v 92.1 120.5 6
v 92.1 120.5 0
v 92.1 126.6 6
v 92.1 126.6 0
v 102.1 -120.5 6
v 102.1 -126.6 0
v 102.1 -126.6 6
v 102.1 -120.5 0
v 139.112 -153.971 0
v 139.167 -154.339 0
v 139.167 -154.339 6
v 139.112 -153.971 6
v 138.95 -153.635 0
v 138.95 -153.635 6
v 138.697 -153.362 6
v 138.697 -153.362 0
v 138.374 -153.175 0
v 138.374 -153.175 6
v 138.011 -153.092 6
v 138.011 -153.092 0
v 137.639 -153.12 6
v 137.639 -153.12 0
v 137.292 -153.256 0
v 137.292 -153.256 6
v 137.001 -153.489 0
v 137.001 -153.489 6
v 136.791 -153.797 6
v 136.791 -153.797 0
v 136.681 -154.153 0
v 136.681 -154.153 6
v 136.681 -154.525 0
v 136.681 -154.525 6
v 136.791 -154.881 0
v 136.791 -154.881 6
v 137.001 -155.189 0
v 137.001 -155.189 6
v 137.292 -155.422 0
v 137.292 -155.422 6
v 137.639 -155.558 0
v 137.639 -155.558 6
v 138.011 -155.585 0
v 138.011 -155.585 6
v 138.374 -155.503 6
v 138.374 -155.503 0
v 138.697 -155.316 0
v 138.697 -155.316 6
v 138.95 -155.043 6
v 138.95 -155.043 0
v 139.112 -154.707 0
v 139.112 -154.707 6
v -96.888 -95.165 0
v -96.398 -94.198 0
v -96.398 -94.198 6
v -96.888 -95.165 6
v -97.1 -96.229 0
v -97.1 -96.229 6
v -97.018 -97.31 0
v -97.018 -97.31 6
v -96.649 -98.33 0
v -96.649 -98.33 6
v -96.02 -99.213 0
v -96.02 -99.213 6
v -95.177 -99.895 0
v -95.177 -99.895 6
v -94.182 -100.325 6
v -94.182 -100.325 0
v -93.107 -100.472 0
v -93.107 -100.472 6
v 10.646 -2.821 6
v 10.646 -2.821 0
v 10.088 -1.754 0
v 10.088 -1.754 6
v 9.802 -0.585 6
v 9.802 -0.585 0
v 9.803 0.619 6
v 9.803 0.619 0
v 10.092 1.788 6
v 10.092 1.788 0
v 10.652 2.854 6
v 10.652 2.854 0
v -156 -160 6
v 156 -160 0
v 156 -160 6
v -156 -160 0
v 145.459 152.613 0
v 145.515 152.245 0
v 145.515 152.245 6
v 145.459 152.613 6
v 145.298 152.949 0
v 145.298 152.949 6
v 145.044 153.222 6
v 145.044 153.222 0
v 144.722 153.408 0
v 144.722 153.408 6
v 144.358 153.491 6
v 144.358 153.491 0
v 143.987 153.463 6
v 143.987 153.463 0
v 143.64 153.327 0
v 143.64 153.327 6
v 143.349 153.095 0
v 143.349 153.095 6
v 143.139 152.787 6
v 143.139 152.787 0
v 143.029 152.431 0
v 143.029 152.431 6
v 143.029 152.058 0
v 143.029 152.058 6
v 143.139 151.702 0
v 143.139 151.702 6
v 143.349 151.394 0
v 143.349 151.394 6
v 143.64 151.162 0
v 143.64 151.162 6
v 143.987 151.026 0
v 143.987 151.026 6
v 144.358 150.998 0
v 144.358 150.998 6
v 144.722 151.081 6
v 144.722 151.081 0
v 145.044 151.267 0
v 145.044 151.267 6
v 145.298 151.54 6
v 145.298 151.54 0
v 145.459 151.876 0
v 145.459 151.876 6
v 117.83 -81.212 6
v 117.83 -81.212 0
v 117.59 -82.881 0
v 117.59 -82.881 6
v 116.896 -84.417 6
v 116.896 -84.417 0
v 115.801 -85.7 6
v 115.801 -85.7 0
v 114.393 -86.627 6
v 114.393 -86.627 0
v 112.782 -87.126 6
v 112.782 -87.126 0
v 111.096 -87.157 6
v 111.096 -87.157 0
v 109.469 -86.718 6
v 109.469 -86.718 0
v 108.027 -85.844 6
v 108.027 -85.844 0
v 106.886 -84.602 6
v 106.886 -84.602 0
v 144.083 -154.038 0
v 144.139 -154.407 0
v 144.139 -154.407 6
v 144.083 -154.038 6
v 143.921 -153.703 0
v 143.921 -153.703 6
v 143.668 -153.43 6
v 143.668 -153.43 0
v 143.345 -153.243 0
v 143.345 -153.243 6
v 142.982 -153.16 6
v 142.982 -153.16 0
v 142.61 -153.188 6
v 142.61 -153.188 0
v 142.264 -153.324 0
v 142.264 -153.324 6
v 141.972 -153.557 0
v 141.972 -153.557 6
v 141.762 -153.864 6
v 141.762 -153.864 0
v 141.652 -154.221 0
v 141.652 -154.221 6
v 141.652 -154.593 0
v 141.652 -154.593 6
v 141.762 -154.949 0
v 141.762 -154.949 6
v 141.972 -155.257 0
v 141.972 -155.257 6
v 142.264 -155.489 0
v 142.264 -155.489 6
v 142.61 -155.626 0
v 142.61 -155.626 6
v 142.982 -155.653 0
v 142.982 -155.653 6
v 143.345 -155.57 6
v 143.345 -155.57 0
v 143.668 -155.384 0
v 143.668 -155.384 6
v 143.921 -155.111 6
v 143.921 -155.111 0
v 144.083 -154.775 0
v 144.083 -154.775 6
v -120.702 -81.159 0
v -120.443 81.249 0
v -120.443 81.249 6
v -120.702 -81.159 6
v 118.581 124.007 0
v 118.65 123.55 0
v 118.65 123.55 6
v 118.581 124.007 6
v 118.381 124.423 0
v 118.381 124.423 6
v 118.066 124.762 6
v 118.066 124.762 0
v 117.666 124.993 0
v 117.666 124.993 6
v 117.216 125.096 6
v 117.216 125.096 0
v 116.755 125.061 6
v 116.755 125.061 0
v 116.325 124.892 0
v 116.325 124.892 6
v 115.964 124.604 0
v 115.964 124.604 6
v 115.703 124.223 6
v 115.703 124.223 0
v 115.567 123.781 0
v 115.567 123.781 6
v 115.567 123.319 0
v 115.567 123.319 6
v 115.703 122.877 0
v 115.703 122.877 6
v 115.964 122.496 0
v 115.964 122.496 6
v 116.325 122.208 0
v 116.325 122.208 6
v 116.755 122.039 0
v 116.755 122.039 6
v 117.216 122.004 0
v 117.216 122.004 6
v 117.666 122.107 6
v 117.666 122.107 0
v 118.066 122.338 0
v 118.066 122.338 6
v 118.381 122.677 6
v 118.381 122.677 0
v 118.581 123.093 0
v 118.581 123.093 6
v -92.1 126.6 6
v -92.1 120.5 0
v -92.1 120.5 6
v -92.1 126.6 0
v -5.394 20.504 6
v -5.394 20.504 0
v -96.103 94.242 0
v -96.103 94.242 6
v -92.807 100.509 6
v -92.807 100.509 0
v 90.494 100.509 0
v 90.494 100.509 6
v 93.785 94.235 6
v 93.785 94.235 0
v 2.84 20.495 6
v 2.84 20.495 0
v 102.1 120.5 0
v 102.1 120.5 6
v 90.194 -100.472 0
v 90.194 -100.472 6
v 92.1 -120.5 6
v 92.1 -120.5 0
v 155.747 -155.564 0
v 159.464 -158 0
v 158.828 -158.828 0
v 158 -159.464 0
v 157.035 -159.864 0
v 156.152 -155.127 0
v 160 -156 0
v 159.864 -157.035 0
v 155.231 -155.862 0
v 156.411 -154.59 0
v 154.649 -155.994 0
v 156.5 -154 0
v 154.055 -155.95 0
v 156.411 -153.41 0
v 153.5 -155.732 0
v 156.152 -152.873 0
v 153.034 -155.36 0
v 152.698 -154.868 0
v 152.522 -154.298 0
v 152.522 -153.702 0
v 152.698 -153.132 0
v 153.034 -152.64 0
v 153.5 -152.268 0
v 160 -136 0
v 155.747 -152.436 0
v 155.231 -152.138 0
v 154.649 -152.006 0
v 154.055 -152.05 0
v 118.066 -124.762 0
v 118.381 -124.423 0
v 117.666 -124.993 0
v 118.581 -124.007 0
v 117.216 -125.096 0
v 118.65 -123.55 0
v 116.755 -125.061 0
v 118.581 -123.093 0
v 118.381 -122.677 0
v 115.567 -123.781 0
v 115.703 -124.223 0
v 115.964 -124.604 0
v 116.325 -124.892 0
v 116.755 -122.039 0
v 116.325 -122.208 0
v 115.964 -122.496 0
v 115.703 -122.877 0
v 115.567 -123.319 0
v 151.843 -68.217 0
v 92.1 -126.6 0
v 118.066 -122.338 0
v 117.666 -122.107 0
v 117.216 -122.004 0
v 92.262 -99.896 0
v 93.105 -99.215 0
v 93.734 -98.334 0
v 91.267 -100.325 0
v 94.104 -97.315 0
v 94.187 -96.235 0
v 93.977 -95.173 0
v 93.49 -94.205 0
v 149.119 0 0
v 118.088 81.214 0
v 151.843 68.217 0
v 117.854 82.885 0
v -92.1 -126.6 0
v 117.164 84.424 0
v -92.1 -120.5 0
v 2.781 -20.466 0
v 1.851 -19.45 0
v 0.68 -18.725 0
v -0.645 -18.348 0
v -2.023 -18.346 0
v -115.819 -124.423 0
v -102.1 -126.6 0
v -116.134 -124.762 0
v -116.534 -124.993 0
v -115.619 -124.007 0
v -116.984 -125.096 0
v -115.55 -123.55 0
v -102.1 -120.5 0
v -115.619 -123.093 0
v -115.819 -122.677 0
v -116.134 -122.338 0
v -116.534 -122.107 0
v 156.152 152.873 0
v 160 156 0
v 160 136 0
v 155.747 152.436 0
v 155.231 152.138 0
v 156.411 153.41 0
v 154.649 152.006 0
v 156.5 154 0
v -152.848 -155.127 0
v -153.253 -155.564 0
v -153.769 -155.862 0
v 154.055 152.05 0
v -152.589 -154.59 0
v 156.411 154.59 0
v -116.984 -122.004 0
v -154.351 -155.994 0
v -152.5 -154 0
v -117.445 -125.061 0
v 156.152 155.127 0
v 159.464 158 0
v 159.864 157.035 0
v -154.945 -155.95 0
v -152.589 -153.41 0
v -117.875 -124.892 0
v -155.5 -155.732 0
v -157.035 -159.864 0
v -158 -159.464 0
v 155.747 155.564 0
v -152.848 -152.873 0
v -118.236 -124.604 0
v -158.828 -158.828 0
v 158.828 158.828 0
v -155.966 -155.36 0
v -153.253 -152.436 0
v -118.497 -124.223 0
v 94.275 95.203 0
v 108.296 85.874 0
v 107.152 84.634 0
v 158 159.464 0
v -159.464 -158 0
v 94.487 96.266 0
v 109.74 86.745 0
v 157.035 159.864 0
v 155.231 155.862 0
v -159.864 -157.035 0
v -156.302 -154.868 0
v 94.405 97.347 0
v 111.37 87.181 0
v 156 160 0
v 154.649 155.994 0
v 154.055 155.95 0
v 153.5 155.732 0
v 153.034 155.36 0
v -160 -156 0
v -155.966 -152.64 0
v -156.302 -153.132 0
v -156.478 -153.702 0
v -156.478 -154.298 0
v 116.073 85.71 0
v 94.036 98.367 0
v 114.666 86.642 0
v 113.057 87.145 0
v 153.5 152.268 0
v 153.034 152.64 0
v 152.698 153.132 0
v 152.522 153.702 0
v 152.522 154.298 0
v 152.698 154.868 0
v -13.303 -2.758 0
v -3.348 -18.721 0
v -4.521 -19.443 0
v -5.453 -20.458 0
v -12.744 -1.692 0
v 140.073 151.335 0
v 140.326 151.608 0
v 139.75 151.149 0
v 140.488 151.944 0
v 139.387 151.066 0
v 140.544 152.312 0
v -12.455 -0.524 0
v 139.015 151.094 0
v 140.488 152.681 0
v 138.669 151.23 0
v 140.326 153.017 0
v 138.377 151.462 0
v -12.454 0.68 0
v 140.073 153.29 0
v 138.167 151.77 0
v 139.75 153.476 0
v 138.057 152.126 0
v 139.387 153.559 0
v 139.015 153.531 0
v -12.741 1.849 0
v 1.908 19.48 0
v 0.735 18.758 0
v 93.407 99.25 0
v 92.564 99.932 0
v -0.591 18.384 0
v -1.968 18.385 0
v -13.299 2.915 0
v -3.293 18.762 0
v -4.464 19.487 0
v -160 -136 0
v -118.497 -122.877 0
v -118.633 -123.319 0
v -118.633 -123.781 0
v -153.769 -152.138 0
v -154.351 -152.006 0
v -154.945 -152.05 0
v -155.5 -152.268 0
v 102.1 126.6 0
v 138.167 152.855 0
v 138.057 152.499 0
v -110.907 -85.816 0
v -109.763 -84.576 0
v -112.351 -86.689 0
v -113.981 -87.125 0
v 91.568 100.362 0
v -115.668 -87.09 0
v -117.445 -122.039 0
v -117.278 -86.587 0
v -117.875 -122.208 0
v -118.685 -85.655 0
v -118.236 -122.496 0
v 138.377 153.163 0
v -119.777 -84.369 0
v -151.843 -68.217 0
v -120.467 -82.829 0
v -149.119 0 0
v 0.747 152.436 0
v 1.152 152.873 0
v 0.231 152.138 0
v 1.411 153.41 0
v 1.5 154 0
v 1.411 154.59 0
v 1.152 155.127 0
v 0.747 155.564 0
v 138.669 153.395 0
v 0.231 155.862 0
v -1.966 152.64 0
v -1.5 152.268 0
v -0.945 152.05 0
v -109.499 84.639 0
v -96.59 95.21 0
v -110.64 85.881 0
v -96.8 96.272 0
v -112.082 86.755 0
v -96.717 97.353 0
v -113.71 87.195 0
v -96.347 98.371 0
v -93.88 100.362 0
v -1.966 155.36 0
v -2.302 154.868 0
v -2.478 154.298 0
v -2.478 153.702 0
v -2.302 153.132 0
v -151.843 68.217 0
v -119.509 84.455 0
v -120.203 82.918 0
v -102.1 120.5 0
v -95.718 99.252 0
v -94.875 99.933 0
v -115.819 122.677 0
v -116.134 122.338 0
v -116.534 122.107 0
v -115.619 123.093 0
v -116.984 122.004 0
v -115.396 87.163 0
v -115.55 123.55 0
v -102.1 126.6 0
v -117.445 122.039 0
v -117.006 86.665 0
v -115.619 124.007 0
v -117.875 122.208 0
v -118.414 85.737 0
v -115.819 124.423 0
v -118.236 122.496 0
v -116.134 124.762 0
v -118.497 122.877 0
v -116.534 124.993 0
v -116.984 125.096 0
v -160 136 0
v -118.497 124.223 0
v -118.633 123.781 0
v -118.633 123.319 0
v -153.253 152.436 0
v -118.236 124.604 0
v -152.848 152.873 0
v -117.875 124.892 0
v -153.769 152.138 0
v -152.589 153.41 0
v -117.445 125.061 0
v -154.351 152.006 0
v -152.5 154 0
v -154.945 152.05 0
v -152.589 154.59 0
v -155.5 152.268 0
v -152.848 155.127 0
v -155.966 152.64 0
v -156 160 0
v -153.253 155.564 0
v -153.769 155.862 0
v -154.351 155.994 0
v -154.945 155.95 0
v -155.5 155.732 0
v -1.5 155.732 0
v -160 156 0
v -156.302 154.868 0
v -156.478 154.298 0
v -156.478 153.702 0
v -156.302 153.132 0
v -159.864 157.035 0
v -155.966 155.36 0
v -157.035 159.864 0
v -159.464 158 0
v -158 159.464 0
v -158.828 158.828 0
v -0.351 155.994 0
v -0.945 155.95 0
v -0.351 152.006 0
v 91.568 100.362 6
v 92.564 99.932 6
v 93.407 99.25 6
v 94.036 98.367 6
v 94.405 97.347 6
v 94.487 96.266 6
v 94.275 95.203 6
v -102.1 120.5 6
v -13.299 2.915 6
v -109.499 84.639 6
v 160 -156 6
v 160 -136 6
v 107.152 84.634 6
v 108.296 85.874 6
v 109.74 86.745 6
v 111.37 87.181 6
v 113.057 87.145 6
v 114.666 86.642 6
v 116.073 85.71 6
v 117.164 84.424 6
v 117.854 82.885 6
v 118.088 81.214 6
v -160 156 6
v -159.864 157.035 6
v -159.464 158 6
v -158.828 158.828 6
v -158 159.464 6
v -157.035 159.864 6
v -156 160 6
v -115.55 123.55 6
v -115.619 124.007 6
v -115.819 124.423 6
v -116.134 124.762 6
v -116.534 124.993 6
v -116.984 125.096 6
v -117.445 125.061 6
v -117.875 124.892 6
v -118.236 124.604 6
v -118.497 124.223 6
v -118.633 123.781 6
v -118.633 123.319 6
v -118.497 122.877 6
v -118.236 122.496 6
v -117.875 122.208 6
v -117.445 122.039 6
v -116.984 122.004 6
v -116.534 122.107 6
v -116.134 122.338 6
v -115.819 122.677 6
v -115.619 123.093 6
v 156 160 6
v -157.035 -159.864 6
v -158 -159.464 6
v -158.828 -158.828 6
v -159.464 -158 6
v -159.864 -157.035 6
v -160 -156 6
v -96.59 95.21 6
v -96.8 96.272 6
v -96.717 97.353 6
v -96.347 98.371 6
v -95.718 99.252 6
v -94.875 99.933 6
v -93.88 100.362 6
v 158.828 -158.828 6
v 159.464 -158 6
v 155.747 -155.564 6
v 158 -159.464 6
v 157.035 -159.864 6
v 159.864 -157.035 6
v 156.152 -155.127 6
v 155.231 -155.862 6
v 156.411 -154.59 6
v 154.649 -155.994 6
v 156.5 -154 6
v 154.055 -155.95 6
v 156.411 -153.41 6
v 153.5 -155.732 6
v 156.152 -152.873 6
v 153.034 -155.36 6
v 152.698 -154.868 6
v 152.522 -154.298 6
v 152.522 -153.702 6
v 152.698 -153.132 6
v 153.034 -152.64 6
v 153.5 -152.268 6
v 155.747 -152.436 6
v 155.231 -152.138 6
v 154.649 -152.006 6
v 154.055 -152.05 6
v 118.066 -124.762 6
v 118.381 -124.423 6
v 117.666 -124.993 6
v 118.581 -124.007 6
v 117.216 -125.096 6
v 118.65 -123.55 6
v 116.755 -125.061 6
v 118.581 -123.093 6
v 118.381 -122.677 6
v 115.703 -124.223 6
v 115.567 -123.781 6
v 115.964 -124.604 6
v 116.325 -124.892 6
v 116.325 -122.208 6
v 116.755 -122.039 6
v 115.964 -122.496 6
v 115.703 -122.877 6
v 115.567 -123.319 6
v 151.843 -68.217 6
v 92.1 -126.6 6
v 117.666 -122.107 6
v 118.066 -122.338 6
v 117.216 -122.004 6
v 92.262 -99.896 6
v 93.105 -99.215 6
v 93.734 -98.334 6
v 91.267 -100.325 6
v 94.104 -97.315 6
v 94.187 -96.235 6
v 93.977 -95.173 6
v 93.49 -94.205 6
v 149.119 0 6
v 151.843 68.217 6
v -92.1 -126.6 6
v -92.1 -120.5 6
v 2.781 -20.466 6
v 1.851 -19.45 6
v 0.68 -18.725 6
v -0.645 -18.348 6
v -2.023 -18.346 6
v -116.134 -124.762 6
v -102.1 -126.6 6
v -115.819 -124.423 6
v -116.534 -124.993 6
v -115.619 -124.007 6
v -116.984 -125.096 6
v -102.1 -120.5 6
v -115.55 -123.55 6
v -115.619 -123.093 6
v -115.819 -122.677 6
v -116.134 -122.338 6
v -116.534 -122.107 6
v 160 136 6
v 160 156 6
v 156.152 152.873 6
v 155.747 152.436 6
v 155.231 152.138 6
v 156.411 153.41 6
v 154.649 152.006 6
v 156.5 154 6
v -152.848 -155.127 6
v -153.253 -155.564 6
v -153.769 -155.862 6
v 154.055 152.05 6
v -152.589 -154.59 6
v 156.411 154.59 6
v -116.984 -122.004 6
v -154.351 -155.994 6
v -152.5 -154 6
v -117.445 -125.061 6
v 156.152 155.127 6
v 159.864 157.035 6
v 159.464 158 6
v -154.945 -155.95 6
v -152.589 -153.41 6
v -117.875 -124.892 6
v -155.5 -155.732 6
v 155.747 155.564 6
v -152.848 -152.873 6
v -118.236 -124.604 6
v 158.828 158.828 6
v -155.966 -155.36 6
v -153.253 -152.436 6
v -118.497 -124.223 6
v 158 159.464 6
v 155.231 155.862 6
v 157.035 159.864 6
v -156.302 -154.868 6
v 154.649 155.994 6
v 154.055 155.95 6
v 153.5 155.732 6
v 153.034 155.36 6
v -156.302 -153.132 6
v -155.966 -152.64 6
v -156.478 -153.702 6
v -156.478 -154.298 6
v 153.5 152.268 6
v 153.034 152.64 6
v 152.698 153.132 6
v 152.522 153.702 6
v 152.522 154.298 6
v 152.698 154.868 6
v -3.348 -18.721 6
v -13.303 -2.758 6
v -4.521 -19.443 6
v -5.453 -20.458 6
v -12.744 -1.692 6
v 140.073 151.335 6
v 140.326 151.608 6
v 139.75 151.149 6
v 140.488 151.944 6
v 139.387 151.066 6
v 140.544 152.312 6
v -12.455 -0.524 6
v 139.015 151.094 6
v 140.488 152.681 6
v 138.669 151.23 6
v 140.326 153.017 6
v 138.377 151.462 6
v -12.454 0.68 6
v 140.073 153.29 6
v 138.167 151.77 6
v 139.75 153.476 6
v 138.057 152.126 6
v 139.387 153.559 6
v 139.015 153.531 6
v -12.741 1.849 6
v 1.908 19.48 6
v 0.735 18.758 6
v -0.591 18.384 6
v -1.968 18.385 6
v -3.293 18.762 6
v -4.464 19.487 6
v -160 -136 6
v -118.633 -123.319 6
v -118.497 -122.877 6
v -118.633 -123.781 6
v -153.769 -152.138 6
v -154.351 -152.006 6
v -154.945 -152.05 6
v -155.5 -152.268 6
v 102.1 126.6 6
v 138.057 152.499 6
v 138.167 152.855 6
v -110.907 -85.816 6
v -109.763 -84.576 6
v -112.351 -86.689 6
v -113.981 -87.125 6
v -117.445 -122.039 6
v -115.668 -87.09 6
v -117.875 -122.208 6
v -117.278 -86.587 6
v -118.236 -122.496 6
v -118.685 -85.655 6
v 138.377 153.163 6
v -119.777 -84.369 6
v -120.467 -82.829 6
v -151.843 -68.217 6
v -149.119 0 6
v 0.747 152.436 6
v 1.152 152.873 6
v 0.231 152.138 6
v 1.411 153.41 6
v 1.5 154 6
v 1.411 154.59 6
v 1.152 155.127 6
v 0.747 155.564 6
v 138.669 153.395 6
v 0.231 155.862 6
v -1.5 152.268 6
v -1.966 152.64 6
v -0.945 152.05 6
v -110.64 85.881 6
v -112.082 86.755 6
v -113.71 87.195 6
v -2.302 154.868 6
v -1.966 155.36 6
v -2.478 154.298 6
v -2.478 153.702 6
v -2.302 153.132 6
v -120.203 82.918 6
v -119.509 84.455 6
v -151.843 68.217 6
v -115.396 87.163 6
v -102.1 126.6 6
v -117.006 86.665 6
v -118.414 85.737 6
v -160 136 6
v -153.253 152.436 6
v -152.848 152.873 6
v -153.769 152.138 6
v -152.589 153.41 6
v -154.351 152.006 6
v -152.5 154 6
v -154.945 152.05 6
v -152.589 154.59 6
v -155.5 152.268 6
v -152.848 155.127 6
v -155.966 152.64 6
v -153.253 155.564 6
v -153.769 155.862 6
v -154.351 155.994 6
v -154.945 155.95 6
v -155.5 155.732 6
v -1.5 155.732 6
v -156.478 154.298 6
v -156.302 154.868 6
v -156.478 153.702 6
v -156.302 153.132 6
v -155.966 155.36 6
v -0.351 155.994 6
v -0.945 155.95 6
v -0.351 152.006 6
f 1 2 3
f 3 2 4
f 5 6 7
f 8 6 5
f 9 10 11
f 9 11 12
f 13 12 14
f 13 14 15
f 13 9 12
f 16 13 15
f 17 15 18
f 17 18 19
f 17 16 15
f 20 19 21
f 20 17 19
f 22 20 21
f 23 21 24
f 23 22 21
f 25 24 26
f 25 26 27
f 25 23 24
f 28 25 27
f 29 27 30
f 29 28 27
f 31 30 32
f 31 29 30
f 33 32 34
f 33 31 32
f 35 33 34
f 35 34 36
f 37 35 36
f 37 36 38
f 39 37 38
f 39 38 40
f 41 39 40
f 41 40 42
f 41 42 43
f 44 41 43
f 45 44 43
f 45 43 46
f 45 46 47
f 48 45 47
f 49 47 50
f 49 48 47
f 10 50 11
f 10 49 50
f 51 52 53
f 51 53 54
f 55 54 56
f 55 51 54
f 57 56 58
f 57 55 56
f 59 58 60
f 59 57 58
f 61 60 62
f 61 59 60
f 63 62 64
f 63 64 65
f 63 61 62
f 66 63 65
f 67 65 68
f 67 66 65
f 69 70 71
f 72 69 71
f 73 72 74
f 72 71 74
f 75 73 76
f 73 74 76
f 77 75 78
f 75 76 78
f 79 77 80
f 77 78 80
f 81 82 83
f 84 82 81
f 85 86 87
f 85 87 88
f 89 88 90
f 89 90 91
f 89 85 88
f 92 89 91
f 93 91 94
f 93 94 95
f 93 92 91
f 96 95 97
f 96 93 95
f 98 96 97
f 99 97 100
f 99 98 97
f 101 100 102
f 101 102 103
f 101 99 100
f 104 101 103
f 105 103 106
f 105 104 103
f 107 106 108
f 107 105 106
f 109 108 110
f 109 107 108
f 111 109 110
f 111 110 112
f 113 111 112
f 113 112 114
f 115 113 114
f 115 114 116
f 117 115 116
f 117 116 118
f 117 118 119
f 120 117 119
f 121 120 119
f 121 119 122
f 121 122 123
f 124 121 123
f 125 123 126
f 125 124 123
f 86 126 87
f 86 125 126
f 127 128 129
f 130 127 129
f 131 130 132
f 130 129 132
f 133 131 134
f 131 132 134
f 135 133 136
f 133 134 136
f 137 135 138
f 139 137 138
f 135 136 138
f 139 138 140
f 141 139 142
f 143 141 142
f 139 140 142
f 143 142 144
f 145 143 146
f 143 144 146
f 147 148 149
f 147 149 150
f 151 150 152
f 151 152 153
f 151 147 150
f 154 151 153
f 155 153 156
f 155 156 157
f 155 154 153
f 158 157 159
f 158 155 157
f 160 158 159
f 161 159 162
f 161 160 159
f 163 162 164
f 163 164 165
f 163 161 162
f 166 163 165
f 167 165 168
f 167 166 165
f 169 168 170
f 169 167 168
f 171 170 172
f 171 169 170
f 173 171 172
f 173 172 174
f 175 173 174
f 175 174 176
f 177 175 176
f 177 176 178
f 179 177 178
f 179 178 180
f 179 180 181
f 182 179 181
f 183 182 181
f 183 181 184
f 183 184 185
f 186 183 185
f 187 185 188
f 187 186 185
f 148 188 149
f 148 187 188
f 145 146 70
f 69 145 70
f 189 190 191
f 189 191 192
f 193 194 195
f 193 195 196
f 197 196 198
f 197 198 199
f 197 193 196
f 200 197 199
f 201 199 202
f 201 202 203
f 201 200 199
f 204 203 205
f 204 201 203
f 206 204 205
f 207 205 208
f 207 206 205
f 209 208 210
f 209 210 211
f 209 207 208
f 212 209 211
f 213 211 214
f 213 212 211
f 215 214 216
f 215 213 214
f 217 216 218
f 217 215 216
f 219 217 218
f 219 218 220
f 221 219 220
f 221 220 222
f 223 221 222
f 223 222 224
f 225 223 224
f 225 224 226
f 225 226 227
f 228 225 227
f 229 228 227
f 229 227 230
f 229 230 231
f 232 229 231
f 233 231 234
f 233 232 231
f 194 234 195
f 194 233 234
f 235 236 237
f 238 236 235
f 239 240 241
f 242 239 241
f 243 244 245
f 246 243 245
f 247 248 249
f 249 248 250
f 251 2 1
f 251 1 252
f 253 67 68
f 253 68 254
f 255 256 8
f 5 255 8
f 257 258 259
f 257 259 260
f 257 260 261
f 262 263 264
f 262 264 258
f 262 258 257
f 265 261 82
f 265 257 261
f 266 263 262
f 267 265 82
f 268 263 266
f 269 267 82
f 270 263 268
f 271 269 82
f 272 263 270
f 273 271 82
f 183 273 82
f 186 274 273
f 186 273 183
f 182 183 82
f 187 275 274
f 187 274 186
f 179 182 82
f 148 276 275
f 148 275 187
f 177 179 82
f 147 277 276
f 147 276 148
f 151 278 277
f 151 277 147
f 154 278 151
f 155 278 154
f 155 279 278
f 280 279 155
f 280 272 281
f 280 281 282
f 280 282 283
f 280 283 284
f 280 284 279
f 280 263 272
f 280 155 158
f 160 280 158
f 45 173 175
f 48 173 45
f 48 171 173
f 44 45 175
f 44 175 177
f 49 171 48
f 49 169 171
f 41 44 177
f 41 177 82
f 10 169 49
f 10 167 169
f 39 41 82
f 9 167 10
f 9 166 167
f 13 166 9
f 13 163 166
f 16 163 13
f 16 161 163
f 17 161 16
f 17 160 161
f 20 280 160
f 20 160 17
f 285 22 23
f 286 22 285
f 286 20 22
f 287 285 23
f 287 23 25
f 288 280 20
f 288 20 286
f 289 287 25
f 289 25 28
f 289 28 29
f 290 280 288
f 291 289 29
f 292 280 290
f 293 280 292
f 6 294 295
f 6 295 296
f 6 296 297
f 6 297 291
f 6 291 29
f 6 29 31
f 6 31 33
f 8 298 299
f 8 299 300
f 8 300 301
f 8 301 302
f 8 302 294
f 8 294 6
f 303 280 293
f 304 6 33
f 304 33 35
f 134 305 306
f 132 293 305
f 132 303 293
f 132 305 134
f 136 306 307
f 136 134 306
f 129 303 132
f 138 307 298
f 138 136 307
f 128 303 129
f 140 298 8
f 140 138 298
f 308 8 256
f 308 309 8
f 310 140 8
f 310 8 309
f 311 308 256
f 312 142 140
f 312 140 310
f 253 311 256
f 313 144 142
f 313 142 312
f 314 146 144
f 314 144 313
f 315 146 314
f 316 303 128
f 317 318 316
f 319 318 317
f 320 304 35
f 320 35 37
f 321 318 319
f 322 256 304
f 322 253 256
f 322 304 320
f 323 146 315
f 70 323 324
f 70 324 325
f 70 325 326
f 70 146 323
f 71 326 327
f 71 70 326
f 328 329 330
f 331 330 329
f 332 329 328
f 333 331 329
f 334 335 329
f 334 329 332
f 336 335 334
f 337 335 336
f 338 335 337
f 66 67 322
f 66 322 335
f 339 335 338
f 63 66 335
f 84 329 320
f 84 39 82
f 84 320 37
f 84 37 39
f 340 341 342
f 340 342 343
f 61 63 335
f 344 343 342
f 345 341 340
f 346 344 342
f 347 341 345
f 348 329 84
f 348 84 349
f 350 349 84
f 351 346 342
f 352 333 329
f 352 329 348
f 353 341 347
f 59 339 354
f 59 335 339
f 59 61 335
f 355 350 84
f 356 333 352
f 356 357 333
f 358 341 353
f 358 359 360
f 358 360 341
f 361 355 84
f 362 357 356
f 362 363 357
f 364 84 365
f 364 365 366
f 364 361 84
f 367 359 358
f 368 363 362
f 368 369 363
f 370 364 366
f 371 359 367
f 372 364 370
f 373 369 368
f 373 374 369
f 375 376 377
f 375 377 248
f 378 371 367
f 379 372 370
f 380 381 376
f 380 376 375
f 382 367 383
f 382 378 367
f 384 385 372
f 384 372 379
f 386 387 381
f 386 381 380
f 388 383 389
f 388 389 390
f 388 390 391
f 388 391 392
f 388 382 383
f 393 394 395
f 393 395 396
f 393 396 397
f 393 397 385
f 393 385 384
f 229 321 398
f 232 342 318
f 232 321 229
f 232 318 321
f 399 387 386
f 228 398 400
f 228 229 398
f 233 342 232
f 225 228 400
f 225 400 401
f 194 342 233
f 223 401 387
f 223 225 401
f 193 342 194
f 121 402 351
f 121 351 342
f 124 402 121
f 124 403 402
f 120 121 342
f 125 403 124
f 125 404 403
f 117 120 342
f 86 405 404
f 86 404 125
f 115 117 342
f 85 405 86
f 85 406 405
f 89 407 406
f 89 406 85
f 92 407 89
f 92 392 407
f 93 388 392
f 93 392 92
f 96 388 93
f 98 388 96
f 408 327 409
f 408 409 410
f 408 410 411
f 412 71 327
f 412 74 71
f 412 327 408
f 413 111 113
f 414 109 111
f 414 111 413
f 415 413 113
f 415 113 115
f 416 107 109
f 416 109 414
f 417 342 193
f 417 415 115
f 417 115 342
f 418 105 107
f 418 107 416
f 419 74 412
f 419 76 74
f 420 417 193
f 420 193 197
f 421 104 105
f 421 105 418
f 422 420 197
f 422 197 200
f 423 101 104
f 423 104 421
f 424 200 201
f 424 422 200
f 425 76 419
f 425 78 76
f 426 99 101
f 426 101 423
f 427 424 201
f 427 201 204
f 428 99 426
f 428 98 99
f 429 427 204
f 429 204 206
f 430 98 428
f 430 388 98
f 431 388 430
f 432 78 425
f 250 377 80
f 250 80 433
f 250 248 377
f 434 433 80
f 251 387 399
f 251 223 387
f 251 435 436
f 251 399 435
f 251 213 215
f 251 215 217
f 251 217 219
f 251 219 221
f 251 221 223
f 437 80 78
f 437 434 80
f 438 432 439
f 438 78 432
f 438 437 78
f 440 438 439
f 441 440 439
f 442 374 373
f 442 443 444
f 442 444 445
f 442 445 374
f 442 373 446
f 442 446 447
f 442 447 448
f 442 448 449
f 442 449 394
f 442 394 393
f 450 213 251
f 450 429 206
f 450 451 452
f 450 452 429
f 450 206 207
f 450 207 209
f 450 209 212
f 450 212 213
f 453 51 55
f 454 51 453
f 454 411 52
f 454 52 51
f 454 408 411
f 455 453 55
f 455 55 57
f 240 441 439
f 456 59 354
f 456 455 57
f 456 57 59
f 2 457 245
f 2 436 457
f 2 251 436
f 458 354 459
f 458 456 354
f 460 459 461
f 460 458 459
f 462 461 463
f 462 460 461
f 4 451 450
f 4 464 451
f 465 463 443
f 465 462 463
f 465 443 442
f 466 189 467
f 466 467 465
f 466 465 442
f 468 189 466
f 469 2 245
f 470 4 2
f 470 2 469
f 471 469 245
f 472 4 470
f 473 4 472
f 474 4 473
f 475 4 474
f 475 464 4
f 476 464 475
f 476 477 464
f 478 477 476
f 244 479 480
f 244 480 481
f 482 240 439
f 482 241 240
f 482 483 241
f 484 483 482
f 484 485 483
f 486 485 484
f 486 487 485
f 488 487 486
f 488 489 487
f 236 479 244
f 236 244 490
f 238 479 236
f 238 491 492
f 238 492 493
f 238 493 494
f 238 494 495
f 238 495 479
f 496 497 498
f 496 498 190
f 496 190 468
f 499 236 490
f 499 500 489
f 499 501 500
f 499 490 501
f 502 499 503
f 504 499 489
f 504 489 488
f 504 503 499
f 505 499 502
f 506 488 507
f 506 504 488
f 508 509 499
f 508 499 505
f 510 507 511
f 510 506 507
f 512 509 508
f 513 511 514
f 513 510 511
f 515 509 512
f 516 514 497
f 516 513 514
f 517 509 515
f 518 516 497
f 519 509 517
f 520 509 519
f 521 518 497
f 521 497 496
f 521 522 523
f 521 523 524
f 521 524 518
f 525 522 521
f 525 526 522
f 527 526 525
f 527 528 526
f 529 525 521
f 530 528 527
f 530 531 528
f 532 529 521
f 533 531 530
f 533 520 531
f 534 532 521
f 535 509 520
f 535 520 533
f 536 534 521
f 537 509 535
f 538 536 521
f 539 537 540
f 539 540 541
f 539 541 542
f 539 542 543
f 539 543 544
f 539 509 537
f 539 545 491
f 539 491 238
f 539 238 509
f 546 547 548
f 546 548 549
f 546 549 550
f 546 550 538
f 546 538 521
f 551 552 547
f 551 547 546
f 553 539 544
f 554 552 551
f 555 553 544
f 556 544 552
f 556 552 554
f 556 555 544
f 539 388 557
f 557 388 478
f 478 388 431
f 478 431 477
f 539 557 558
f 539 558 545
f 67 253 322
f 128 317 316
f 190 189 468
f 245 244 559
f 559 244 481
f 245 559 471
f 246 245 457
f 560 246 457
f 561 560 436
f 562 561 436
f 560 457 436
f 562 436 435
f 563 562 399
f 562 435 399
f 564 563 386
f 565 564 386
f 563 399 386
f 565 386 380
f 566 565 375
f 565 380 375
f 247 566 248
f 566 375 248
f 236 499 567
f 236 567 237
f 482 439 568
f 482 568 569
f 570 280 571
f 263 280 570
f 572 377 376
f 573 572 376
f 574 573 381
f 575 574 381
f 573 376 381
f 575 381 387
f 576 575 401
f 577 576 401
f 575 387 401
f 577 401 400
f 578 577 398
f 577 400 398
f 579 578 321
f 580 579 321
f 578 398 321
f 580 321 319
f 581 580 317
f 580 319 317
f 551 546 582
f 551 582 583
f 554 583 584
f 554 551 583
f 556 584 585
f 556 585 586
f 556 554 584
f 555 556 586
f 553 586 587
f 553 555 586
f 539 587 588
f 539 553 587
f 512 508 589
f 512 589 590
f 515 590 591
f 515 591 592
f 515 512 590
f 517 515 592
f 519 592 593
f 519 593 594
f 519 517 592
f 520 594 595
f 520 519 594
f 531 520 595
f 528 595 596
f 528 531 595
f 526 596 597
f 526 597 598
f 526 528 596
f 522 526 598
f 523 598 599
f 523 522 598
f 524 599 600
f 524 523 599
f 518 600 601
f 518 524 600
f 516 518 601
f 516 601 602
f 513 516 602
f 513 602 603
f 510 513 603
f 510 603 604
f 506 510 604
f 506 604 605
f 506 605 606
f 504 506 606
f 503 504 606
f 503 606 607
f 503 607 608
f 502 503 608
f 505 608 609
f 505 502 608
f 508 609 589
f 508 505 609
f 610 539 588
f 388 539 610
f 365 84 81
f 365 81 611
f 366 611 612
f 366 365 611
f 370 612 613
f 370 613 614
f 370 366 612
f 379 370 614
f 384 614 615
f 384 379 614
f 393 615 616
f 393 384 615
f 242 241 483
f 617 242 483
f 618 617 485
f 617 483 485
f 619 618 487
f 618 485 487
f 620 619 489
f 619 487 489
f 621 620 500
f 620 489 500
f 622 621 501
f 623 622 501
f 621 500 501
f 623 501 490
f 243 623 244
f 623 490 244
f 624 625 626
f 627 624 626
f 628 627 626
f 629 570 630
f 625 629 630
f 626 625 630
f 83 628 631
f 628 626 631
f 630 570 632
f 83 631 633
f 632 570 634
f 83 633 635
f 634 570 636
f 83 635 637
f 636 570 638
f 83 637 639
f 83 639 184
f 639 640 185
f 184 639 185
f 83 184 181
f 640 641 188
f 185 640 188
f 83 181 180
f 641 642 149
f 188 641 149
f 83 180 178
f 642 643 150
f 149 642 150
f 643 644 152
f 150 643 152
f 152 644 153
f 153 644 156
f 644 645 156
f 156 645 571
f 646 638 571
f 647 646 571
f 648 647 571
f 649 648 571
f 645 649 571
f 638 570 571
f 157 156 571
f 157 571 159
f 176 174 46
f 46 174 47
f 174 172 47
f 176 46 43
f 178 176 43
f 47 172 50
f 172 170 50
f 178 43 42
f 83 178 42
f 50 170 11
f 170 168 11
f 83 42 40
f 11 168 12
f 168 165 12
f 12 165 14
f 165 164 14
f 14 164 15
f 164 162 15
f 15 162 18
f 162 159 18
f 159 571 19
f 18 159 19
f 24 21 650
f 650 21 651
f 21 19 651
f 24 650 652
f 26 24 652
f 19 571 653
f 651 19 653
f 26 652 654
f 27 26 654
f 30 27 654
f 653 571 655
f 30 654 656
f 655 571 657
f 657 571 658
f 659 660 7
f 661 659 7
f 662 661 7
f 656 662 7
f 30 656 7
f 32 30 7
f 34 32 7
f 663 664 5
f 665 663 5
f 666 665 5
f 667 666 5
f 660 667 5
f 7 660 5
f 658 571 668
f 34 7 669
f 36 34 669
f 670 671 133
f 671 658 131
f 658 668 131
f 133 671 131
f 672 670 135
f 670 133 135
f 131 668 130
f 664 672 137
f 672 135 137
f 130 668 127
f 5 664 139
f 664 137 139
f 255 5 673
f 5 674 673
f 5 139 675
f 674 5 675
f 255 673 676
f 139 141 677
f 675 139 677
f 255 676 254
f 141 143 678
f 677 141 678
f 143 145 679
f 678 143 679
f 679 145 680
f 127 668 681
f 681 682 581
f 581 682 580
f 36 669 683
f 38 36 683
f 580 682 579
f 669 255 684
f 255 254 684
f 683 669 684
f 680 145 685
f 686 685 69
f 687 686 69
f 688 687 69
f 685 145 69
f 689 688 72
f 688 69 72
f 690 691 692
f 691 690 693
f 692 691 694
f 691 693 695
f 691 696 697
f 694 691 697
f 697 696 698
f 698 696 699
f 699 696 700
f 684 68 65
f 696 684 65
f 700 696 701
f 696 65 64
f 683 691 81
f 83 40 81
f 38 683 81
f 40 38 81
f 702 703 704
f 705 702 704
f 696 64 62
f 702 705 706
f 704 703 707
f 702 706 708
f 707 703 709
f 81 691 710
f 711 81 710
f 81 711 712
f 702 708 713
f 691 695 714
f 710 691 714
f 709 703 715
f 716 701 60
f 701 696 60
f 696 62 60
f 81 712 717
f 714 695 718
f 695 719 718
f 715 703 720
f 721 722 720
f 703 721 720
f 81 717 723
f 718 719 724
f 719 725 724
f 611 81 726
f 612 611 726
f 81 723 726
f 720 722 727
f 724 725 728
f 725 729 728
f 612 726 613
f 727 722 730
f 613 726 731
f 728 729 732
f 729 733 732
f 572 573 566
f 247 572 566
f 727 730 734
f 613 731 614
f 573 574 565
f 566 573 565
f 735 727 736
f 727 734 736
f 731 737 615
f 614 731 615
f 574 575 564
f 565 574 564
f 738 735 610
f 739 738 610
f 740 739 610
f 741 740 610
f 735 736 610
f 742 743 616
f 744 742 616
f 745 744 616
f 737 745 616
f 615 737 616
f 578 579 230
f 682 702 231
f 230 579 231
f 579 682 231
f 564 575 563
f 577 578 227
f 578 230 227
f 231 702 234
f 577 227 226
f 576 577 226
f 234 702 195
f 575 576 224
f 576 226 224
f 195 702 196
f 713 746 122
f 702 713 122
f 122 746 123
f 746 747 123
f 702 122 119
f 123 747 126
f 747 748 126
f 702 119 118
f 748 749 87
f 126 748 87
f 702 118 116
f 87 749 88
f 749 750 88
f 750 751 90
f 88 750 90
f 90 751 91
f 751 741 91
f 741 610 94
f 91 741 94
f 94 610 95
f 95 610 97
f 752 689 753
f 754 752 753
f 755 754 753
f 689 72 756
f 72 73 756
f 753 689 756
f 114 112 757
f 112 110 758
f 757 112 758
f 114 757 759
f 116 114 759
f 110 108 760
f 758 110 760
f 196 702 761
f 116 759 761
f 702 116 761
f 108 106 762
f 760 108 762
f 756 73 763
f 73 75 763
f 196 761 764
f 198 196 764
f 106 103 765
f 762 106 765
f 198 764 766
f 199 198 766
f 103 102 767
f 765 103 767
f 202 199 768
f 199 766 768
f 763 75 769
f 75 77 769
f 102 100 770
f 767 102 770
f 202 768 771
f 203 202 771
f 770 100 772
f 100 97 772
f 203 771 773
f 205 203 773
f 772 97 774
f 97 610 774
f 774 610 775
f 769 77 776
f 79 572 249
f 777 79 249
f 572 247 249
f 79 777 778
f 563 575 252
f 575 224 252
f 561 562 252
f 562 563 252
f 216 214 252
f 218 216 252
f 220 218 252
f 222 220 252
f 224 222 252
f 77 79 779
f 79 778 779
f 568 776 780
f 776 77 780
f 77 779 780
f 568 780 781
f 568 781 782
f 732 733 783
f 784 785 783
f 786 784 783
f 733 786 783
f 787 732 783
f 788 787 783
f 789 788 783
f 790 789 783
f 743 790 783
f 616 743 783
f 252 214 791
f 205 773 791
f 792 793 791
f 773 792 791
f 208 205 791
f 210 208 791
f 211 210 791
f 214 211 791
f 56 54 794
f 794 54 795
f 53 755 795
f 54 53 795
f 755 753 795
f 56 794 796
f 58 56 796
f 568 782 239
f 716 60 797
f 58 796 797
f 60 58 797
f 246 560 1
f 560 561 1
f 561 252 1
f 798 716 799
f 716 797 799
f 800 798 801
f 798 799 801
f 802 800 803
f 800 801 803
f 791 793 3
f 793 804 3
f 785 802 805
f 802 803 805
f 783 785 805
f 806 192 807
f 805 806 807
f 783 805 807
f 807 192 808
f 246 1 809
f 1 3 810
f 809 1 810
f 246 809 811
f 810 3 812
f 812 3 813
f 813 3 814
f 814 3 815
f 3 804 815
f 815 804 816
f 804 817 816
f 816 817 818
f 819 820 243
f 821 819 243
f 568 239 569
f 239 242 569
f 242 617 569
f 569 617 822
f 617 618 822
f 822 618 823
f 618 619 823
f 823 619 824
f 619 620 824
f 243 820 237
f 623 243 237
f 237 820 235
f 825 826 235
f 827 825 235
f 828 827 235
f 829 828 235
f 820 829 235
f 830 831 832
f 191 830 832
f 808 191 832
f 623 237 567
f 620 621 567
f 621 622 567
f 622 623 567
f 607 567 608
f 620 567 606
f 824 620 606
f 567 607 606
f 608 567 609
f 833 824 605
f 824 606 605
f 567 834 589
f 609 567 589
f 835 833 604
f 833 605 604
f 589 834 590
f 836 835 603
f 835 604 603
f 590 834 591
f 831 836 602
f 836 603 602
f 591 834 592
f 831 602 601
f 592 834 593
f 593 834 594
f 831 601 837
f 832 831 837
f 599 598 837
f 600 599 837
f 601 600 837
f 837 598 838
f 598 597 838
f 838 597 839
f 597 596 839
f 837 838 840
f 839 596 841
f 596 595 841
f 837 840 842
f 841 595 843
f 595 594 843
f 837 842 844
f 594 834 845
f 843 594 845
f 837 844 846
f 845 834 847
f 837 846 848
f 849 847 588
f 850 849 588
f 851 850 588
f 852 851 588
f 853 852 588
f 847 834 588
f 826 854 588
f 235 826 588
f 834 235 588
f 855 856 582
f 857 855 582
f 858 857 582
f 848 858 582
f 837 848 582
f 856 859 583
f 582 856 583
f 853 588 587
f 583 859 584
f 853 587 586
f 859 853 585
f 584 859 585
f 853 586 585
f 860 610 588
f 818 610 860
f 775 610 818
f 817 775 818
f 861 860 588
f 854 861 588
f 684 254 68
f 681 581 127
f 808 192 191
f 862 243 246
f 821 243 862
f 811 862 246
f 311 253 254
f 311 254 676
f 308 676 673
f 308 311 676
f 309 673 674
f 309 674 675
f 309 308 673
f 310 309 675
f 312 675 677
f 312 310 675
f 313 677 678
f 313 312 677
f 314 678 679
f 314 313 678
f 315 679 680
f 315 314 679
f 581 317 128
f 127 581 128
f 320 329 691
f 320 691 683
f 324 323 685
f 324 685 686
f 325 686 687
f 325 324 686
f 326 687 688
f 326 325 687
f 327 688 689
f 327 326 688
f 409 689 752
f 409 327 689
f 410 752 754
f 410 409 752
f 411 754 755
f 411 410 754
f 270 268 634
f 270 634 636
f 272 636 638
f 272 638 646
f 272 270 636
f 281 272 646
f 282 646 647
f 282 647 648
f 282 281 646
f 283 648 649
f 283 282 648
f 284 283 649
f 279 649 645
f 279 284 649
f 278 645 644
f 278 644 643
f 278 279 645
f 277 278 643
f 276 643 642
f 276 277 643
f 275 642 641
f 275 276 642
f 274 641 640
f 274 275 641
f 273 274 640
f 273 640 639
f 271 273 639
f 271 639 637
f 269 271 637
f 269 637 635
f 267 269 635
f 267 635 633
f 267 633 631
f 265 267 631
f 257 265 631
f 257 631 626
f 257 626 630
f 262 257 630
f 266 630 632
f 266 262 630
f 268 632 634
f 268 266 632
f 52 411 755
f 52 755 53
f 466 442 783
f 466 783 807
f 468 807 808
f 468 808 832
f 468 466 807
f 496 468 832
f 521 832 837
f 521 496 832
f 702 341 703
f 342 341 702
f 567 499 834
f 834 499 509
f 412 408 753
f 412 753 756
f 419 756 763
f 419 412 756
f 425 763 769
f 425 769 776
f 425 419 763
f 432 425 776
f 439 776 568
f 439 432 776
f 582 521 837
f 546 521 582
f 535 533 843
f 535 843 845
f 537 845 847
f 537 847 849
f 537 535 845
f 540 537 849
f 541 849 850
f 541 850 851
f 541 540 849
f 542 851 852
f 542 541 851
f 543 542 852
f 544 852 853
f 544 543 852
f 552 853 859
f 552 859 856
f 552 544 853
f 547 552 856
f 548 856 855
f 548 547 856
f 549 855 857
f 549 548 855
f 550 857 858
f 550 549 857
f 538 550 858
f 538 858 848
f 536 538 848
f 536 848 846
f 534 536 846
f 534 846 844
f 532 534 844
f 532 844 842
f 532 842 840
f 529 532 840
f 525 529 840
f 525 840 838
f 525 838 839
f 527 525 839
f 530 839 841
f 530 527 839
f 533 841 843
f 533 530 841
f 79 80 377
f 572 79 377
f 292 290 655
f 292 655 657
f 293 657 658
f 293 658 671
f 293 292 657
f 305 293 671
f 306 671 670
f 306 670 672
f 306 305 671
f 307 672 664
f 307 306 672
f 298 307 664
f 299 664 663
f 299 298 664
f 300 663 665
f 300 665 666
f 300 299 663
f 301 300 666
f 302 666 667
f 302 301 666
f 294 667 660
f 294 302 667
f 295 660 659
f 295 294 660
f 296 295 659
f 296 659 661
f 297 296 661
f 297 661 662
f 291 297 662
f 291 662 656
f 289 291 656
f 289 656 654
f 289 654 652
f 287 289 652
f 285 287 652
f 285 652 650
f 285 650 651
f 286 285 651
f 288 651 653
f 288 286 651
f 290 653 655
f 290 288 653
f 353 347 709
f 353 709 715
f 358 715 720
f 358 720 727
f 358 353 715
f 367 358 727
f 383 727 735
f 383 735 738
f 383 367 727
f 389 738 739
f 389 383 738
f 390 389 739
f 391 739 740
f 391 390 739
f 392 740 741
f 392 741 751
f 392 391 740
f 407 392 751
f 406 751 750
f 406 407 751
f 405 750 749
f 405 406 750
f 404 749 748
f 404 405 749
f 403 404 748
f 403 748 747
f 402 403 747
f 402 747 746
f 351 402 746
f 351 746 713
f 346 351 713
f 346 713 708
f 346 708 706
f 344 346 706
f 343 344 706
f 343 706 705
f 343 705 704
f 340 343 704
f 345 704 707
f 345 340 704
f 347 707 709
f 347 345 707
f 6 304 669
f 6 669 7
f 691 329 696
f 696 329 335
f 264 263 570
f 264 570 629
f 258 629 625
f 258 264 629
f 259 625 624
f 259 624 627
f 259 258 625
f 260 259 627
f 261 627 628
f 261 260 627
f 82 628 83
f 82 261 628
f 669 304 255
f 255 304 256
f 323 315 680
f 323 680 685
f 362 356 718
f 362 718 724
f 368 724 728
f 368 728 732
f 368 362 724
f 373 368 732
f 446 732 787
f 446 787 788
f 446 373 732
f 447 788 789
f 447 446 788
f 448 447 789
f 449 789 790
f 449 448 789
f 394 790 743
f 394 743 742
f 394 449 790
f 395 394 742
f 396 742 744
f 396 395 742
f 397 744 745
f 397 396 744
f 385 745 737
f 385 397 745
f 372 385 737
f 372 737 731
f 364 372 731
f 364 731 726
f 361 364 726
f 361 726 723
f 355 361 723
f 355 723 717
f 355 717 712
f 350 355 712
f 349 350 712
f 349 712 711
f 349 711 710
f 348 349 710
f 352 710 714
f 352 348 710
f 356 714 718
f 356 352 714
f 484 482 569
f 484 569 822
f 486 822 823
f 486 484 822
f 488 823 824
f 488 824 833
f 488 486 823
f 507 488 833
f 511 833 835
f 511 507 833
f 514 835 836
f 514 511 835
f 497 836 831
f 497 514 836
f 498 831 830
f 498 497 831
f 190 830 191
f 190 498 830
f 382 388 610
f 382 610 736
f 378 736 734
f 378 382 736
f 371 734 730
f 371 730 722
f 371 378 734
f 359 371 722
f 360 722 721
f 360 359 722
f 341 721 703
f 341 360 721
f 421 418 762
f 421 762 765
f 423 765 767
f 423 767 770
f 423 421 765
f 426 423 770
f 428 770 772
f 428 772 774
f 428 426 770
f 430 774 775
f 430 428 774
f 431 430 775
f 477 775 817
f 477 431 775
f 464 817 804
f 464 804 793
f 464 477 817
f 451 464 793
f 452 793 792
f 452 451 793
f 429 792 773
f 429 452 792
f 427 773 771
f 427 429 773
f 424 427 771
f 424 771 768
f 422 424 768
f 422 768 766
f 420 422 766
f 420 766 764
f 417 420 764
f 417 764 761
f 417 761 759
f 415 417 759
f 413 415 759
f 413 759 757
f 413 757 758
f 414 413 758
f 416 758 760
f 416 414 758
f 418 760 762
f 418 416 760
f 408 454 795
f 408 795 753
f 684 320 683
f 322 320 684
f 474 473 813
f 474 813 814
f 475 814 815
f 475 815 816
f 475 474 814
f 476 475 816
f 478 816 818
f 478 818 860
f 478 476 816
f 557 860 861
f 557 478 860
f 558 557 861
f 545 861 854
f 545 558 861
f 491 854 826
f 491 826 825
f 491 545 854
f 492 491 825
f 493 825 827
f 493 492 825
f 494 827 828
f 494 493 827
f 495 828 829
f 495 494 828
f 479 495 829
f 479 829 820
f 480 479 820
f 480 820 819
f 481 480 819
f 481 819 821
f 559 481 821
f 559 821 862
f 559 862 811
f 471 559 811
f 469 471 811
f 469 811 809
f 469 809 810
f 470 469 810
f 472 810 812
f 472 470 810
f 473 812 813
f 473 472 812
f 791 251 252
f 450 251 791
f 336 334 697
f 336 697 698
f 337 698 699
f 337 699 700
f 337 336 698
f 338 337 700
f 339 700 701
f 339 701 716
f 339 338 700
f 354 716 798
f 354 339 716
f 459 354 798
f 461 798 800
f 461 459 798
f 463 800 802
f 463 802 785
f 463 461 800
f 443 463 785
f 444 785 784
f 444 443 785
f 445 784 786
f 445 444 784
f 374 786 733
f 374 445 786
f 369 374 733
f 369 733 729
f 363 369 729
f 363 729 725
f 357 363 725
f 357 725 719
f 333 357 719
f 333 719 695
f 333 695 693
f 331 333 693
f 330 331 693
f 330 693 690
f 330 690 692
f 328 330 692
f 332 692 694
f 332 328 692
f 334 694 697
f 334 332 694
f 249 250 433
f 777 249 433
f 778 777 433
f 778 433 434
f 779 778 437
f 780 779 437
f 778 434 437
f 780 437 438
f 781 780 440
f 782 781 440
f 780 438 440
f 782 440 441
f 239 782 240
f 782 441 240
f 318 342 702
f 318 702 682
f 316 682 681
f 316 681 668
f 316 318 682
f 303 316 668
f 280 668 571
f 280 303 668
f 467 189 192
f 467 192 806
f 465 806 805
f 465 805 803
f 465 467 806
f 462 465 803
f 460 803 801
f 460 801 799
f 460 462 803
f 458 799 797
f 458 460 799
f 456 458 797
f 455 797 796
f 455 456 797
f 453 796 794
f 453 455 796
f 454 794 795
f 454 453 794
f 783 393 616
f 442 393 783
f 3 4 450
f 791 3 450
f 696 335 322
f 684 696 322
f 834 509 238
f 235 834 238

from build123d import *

# Parameters (mm, degrees)
SKETCH_1_R      = 2
SKETCH_1_R_2    = 1.55
SKETCH_1_R_3    = 1.25
SKETCH_1_W      = 10
SKETCH_1_H      = 6.1
EXTRUDE_1_DEPTH = 6


with BuildPart() as part:
    # Эскиз1 → Бобышка-Вытянуть1 (new body)
    with BuildSketch(Plane.XY):
        with BuildLine():
            Line((160, 156), (160, 136))
            ThreePointArc((160, 136), (149.118825479, 0), (160, -136))
            Line((160, -136), (160, -156))
            ThreePointArc((160, -156), (158.828427125, -158.828427125), (156, -160))
            Line((156, -160), (136, -160))
            Line((136, -160), (-156, -160))
            ThreePointArc((-156, -160), (-158.828427125, -158.828427125), (-160, -156))
            Line((-160, -156), (-160, -136))
            ThreePointArc((-160, -136), (-149.118825479, 0), (-160, 136))
            Line((-160, 136), (-160, 156))
            ThreePointArc((-160, 156), (-158.828427125, 158.828427125), (-156, 160))
            Line((-156, 160), (136, 160))
            Line((136, 160), (156, 160))
            ThreePointArc((156, 160), (158.828427125, 158.828427125), (160, 156))
        make_face()
        with Locations((-154.5, 154)):
            Circle(SKETCH_1_R, mode=Mode.SUBTRACT)
        with Locations((-154.5, -154)):
            Circle(SKETCH_1_R, mode=Mode.SUBTRACT)
        with Locations((154.5, 154)):
            Circle(SKETCH_1_R, mode=Mode.SUBTRACT)
        with Locations((154.5, -154)):
            Circle(SKETCH_1_R, mode=Mode.SUBTRACT)
        with Locations((117.1, -123.55)):
            Circle(SKETCH_1_R_2, mode=Mode.SUBTRACT)
        with Locations((-117.1, -123.55)):
            Circle(SKETCH_1_R_2, mode=Mode.SUBTRACT)
        with Locations((-117.1, 123.55)):
            Circle(SKETCH_1_R_2, mode=Mode.SUBTRACT)
        with Locations((117.1, 123.55)):
            Circle(SKETCH_1_R_2, mode=Mode.SUBTRACT)
        with Locations((142.88852833, -154.406847052)):
            Circle(SKETCH_1_R_3, mode=Mode.SUBTRACT)
        with Locations((137.91717333, -154.338989052)):
            Circle(SKETCH_1_R_3, mode=Mode.SUBTRACT)
        with Locations((-0.5, 154)):
            Circle(SKETCH_1_R, mode=Mode.SUBTRACT)
        with Locations((144.264881547, 152.244611453)):
            Circle(SKETCH_1_R_3, mode=Mode.SUBTRACT)
        with Locations((139.293526547, 152.312469453)):
            Circle(SKETCH_1_R_3, mode=Mode.SUBTRACT)
        with Locations((97.1, 123.55)):
            Rectangle(SKETCH_1_W, SKETCH_1_H, mode=Mode.SUBTRACT)
        with Locations((-97.1, -123.55)):
            Rectangle(SKETCH_1_W, SKETCH_1_H, mode=Mode.SUBTRACT)
        with Locations((97.1, -123.55)):
            Rectangle(SKETCH_1_W, SKETCH_1_H, mode=Mode.SUBTRACT)
        with Locations((-97.1, 123.55)):
            Rectangle(SKETCH_1_W, SKETCH_1_H, mode=Mode.SUBTRACT)
        with BuildLine():
            Line((93.489652385, -94.205074627), (2.780610095, -20.466408797))
            ThreePointArc((2.780610095, -20.466408797), (-1.333842507, -18.299575929), (-5.45296535, -20.457517519))
            Line((-5.45296535, -20.457517519), (-96.398158259, -94.197961604))
            ThreePointArc((-96.398158259, -94.197961604), (-96.649394743, -98.329753251), (-93.107179505, -100.471606))
            Line((-93.107179505, -100.471606), (90.193770783, -100.471606))
            ThreePointArc((90.193770783, -100.471606), (93.73397738, -98.333577335), (93.489652385, -94.205074627))
        make_face(mode=Mode.SUBTRACT)
        with BuildLine():
            Line((-5.393845546, 20.503538093), (-96.102893823, 94.242212627))
            ThreePointArc((-96.102893823, 94.242212627), (-96.347218817, 98.370715335), (-92.807012221, 100.508744))
            Line((-92.807012221, 100.508744), (90.493950067, 100.508744))
            ThreePointArc((90.493950067, 100.508744), (94.036165305, 98.366891251), (93.784928821, 94.235099604))
            Line((93.784928821, 94.235099604), (2.839729898, 20.494646814))
            ThreePointArc((2.839729898, 20.494646814), (-1.279392944, 18.336705225), (-5.393845546, 20.503538093))
        make_face(mode=Mode.SUBTRACT)
        with BuildLine():
            Line((-109.763358937, -84.575917132), (-13.303284143, -2.757613876))
            ThreePointArc((-13.303284143, -2.757613876), (-12.418558312, 0.078161869), (-13.298704681, 2.915362292))
            Line((-13.298704681, 2.915362292), (-109.49916318, 84.639383129))
            ThreePointArc((-109.49916318, 84.639383129), (-116.218458744, 86.97087694), (-120.442977971, 81.249143499))
            Line((-120.442977971, 81.249143499), (-120.701678374, -81.158585361))
            ThreePointArc((-120.701678374, -81.158585361), (-116.49090996, -86.895155762), (-109.763358937, -84.575917132))
        make_face(mode=Mode.SUBTRACT)
        with BuildLine():
            Line((106.88592289, -84.602246797), (10.646219109, -2.821157348))
            ThreePointArc((10.646219109, -2.821157348), (9.766074027, 0.017406269), (10.652347669, 2.854062364))
            Line((10.652347669, 2.854062364), (107.15201684, 84.634313992))
            ThreePointArc((107.15201684, 84.634313992), (113.879270457, 86.95037229), (118.088477358, 81.21428961))
            Line((118.088477358, 81.21428961), (117.82973768, -81.212007525))
            ThreePointArc((117.82973768, -81.212007525), (113.605218283, -86.933740662), (106.88592289, -84.602246797))
        make_face(mode=Mode.SUBTRACT)
    extrude(amount=EXTRUDE_1_DEPTH)


solid = part.part
